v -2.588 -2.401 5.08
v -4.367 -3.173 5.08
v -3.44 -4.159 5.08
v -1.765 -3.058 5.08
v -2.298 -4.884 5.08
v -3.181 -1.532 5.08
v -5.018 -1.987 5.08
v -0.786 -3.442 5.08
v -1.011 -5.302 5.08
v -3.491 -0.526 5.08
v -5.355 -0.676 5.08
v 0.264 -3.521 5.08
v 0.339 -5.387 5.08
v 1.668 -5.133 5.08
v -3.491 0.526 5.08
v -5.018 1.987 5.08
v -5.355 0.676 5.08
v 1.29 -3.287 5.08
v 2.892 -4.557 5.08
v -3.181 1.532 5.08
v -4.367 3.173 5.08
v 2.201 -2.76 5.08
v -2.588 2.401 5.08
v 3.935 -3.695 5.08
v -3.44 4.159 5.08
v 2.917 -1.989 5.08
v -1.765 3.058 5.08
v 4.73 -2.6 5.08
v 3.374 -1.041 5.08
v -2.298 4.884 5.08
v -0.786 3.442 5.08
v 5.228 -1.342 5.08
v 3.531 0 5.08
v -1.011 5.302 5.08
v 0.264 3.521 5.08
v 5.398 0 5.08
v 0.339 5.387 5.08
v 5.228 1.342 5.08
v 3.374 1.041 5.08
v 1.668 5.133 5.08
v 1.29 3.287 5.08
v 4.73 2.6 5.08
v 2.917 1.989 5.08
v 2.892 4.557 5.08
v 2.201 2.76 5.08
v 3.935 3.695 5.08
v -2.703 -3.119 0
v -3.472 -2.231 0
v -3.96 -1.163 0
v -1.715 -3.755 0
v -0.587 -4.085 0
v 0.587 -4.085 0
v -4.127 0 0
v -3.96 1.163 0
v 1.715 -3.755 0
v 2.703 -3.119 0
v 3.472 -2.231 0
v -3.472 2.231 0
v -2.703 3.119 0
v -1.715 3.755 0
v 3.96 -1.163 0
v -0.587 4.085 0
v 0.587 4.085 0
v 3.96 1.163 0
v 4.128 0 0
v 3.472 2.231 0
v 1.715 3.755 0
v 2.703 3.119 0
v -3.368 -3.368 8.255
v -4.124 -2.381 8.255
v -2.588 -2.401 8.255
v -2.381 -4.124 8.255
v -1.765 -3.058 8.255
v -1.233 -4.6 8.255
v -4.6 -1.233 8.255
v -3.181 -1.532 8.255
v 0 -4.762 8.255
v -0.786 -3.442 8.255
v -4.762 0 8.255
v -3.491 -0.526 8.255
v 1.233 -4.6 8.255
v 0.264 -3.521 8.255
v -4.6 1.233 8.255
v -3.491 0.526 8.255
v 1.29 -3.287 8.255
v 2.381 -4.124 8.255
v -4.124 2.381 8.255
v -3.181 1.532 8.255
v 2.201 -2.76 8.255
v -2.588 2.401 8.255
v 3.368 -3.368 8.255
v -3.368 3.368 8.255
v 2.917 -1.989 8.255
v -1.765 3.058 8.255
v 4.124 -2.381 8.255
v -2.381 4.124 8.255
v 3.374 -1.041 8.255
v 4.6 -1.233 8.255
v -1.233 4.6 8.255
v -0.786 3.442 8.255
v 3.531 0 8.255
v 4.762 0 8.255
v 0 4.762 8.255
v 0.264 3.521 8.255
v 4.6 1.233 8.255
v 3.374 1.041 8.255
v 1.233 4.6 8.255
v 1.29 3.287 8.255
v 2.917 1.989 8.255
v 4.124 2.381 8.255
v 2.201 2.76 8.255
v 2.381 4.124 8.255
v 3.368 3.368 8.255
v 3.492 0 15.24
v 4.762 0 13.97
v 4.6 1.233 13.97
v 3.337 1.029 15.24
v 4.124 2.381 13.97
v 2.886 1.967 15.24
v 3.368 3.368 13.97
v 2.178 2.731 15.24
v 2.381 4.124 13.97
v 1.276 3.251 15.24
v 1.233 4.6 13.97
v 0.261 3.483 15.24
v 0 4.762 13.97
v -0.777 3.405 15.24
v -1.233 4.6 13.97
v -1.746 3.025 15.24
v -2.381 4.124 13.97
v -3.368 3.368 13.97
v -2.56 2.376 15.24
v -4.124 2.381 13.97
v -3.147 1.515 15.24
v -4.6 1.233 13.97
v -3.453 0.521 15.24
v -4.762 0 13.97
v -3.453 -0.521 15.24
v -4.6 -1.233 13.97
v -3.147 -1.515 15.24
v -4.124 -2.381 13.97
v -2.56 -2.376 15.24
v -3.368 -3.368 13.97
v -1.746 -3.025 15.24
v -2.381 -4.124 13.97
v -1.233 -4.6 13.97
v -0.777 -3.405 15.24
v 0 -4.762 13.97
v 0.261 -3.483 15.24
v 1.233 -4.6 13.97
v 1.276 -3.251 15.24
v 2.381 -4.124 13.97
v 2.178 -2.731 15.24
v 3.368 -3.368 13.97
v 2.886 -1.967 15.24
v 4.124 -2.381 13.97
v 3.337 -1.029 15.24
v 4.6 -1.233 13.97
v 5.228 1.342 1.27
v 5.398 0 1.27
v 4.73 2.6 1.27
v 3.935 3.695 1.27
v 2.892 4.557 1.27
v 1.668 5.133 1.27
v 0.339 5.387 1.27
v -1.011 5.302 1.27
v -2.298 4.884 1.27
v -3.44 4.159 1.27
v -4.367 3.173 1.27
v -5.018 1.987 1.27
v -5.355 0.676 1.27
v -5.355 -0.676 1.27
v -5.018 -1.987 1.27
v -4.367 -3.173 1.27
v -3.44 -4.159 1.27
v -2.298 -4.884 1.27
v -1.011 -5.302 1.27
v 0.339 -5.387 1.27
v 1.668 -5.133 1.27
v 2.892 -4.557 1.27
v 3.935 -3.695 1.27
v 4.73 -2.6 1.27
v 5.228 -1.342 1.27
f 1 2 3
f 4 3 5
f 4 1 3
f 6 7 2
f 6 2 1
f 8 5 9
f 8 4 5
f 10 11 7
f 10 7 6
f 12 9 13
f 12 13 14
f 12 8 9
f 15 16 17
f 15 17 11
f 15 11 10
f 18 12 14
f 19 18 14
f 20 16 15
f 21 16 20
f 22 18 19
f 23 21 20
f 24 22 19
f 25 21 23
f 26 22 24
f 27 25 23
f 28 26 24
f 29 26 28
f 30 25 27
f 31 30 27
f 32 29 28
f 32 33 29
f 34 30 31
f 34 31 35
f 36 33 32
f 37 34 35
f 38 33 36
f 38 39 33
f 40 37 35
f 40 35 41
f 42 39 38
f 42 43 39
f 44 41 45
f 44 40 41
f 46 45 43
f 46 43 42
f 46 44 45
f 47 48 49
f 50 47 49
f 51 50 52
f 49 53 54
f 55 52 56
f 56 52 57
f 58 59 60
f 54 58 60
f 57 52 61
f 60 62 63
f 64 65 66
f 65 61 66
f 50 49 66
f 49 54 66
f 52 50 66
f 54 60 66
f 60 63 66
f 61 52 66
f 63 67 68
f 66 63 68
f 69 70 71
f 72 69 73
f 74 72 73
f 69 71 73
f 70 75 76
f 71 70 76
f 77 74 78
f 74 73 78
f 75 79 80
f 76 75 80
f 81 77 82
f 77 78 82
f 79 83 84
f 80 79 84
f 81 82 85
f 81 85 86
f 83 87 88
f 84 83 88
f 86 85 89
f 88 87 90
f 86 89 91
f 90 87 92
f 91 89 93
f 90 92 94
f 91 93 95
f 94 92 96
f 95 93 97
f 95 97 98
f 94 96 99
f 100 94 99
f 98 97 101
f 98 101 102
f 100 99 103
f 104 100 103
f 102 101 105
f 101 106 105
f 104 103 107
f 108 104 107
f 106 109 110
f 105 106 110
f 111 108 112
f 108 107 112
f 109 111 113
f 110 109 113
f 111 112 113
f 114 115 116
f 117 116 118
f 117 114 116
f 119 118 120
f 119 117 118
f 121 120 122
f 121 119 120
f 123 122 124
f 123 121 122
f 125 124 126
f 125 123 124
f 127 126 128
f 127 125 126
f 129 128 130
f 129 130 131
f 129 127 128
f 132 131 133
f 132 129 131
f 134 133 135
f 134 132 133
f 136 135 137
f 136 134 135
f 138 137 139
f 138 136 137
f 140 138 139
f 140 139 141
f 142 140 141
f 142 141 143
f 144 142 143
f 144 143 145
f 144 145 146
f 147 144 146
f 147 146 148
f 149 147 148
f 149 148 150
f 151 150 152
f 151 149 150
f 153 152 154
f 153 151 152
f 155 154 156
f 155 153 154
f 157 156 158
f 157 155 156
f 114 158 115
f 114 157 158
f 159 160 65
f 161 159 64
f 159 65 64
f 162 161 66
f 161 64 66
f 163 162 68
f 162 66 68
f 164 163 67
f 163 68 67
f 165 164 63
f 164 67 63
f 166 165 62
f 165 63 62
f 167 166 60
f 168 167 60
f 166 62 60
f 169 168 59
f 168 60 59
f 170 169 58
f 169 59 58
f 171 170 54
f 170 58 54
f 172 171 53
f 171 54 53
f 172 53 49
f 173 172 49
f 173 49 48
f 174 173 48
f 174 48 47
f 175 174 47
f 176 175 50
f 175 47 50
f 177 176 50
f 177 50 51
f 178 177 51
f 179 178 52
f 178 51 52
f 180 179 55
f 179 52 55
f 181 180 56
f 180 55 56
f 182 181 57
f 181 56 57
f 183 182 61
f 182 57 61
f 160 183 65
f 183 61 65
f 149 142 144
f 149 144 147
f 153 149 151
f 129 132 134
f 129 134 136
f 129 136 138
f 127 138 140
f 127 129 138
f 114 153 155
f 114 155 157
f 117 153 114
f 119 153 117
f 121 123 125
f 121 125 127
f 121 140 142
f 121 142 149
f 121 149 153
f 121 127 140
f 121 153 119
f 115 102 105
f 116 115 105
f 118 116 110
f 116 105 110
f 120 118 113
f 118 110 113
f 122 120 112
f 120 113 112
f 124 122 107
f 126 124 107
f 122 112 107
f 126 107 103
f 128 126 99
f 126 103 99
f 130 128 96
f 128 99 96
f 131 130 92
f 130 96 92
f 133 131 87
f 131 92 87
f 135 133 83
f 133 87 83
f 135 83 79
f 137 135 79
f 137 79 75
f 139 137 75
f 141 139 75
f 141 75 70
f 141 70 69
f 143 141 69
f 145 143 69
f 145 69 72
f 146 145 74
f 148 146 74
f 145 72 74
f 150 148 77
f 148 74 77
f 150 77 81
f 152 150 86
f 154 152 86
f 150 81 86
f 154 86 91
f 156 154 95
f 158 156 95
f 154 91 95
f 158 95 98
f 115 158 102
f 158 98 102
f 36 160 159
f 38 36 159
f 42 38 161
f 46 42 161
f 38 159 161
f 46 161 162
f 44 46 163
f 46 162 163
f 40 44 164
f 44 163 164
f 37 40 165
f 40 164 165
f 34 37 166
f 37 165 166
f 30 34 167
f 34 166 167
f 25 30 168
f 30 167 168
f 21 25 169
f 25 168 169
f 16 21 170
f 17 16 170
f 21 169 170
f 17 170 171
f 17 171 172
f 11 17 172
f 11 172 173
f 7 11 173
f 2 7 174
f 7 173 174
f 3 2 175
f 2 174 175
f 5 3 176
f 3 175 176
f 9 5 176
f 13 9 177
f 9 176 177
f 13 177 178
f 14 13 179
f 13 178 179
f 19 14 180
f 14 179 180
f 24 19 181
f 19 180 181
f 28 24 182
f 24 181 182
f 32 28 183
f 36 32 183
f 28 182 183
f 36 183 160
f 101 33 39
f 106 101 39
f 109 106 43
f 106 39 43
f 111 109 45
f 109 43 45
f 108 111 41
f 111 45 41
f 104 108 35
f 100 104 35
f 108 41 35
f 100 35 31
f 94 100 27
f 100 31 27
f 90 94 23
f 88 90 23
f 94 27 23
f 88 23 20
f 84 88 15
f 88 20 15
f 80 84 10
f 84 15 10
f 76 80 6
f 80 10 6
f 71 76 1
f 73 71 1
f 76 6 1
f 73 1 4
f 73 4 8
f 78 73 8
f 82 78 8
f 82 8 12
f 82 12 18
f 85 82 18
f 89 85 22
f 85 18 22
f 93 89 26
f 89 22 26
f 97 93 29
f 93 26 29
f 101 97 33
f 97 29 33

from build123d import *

# Parameters (mm, degrees)
SKETCH1_R           = 5.3975
BOSS_EXTRUDE1_DEPTH = 5.08
SKETCH3_R           = 3.5306
BOSS_EXTRUDE2_DEPTH = 3.175
SKETCH4_R           = 4.7625
BOSS_EXTRUDE3_DEPTH = 6.985
CHAMFER1_SIZE       = 1.27
CHAMFER2_SIZE       = 1.27


with BuildPart() as part:
    # Sketch1 → Boss-Extrude1 (new body)
    with BuildSketch(Plane.XY):
        Circle(SKETCH1_R)
    extrude(amount=BOSS_EXTRUDE1_DEPTH)

    # Sketch3 → Boss-Extrude2 (add)
    with BuildSketch(Plane.XY.offset(5.08)):
        Circle(SKETCH3_R)
    extrude(amount=BOSS_EXTRUDE2_DEPTH)

    # Sketch4 → Boss-Extrude3 (add)
    with BuildSketch(Plane.XY.offset(8.255)):
        Circle(SKETCH4_R)
    extrude(amount=BOSS_EXTRUDE3_DEPTH)

    # Chamfer1
    chamfer1_edges = [part.edges().sort_by_distance(p)[0] for p in [
        (-4.7625, 0, 15.24),
    ]]
    chamfer(chamfer1_edges, length=CHAMFER1_SIZE)

    # Chamfer2
    chamfer2_edges = [part.edges().sort_by_distance(p)[0] for p in [
        (-5.3975, 0, 0),
    ]]
    chamfer(chamfer2_edges, length=CHAMFER2_SIZE)


solid = part.part
